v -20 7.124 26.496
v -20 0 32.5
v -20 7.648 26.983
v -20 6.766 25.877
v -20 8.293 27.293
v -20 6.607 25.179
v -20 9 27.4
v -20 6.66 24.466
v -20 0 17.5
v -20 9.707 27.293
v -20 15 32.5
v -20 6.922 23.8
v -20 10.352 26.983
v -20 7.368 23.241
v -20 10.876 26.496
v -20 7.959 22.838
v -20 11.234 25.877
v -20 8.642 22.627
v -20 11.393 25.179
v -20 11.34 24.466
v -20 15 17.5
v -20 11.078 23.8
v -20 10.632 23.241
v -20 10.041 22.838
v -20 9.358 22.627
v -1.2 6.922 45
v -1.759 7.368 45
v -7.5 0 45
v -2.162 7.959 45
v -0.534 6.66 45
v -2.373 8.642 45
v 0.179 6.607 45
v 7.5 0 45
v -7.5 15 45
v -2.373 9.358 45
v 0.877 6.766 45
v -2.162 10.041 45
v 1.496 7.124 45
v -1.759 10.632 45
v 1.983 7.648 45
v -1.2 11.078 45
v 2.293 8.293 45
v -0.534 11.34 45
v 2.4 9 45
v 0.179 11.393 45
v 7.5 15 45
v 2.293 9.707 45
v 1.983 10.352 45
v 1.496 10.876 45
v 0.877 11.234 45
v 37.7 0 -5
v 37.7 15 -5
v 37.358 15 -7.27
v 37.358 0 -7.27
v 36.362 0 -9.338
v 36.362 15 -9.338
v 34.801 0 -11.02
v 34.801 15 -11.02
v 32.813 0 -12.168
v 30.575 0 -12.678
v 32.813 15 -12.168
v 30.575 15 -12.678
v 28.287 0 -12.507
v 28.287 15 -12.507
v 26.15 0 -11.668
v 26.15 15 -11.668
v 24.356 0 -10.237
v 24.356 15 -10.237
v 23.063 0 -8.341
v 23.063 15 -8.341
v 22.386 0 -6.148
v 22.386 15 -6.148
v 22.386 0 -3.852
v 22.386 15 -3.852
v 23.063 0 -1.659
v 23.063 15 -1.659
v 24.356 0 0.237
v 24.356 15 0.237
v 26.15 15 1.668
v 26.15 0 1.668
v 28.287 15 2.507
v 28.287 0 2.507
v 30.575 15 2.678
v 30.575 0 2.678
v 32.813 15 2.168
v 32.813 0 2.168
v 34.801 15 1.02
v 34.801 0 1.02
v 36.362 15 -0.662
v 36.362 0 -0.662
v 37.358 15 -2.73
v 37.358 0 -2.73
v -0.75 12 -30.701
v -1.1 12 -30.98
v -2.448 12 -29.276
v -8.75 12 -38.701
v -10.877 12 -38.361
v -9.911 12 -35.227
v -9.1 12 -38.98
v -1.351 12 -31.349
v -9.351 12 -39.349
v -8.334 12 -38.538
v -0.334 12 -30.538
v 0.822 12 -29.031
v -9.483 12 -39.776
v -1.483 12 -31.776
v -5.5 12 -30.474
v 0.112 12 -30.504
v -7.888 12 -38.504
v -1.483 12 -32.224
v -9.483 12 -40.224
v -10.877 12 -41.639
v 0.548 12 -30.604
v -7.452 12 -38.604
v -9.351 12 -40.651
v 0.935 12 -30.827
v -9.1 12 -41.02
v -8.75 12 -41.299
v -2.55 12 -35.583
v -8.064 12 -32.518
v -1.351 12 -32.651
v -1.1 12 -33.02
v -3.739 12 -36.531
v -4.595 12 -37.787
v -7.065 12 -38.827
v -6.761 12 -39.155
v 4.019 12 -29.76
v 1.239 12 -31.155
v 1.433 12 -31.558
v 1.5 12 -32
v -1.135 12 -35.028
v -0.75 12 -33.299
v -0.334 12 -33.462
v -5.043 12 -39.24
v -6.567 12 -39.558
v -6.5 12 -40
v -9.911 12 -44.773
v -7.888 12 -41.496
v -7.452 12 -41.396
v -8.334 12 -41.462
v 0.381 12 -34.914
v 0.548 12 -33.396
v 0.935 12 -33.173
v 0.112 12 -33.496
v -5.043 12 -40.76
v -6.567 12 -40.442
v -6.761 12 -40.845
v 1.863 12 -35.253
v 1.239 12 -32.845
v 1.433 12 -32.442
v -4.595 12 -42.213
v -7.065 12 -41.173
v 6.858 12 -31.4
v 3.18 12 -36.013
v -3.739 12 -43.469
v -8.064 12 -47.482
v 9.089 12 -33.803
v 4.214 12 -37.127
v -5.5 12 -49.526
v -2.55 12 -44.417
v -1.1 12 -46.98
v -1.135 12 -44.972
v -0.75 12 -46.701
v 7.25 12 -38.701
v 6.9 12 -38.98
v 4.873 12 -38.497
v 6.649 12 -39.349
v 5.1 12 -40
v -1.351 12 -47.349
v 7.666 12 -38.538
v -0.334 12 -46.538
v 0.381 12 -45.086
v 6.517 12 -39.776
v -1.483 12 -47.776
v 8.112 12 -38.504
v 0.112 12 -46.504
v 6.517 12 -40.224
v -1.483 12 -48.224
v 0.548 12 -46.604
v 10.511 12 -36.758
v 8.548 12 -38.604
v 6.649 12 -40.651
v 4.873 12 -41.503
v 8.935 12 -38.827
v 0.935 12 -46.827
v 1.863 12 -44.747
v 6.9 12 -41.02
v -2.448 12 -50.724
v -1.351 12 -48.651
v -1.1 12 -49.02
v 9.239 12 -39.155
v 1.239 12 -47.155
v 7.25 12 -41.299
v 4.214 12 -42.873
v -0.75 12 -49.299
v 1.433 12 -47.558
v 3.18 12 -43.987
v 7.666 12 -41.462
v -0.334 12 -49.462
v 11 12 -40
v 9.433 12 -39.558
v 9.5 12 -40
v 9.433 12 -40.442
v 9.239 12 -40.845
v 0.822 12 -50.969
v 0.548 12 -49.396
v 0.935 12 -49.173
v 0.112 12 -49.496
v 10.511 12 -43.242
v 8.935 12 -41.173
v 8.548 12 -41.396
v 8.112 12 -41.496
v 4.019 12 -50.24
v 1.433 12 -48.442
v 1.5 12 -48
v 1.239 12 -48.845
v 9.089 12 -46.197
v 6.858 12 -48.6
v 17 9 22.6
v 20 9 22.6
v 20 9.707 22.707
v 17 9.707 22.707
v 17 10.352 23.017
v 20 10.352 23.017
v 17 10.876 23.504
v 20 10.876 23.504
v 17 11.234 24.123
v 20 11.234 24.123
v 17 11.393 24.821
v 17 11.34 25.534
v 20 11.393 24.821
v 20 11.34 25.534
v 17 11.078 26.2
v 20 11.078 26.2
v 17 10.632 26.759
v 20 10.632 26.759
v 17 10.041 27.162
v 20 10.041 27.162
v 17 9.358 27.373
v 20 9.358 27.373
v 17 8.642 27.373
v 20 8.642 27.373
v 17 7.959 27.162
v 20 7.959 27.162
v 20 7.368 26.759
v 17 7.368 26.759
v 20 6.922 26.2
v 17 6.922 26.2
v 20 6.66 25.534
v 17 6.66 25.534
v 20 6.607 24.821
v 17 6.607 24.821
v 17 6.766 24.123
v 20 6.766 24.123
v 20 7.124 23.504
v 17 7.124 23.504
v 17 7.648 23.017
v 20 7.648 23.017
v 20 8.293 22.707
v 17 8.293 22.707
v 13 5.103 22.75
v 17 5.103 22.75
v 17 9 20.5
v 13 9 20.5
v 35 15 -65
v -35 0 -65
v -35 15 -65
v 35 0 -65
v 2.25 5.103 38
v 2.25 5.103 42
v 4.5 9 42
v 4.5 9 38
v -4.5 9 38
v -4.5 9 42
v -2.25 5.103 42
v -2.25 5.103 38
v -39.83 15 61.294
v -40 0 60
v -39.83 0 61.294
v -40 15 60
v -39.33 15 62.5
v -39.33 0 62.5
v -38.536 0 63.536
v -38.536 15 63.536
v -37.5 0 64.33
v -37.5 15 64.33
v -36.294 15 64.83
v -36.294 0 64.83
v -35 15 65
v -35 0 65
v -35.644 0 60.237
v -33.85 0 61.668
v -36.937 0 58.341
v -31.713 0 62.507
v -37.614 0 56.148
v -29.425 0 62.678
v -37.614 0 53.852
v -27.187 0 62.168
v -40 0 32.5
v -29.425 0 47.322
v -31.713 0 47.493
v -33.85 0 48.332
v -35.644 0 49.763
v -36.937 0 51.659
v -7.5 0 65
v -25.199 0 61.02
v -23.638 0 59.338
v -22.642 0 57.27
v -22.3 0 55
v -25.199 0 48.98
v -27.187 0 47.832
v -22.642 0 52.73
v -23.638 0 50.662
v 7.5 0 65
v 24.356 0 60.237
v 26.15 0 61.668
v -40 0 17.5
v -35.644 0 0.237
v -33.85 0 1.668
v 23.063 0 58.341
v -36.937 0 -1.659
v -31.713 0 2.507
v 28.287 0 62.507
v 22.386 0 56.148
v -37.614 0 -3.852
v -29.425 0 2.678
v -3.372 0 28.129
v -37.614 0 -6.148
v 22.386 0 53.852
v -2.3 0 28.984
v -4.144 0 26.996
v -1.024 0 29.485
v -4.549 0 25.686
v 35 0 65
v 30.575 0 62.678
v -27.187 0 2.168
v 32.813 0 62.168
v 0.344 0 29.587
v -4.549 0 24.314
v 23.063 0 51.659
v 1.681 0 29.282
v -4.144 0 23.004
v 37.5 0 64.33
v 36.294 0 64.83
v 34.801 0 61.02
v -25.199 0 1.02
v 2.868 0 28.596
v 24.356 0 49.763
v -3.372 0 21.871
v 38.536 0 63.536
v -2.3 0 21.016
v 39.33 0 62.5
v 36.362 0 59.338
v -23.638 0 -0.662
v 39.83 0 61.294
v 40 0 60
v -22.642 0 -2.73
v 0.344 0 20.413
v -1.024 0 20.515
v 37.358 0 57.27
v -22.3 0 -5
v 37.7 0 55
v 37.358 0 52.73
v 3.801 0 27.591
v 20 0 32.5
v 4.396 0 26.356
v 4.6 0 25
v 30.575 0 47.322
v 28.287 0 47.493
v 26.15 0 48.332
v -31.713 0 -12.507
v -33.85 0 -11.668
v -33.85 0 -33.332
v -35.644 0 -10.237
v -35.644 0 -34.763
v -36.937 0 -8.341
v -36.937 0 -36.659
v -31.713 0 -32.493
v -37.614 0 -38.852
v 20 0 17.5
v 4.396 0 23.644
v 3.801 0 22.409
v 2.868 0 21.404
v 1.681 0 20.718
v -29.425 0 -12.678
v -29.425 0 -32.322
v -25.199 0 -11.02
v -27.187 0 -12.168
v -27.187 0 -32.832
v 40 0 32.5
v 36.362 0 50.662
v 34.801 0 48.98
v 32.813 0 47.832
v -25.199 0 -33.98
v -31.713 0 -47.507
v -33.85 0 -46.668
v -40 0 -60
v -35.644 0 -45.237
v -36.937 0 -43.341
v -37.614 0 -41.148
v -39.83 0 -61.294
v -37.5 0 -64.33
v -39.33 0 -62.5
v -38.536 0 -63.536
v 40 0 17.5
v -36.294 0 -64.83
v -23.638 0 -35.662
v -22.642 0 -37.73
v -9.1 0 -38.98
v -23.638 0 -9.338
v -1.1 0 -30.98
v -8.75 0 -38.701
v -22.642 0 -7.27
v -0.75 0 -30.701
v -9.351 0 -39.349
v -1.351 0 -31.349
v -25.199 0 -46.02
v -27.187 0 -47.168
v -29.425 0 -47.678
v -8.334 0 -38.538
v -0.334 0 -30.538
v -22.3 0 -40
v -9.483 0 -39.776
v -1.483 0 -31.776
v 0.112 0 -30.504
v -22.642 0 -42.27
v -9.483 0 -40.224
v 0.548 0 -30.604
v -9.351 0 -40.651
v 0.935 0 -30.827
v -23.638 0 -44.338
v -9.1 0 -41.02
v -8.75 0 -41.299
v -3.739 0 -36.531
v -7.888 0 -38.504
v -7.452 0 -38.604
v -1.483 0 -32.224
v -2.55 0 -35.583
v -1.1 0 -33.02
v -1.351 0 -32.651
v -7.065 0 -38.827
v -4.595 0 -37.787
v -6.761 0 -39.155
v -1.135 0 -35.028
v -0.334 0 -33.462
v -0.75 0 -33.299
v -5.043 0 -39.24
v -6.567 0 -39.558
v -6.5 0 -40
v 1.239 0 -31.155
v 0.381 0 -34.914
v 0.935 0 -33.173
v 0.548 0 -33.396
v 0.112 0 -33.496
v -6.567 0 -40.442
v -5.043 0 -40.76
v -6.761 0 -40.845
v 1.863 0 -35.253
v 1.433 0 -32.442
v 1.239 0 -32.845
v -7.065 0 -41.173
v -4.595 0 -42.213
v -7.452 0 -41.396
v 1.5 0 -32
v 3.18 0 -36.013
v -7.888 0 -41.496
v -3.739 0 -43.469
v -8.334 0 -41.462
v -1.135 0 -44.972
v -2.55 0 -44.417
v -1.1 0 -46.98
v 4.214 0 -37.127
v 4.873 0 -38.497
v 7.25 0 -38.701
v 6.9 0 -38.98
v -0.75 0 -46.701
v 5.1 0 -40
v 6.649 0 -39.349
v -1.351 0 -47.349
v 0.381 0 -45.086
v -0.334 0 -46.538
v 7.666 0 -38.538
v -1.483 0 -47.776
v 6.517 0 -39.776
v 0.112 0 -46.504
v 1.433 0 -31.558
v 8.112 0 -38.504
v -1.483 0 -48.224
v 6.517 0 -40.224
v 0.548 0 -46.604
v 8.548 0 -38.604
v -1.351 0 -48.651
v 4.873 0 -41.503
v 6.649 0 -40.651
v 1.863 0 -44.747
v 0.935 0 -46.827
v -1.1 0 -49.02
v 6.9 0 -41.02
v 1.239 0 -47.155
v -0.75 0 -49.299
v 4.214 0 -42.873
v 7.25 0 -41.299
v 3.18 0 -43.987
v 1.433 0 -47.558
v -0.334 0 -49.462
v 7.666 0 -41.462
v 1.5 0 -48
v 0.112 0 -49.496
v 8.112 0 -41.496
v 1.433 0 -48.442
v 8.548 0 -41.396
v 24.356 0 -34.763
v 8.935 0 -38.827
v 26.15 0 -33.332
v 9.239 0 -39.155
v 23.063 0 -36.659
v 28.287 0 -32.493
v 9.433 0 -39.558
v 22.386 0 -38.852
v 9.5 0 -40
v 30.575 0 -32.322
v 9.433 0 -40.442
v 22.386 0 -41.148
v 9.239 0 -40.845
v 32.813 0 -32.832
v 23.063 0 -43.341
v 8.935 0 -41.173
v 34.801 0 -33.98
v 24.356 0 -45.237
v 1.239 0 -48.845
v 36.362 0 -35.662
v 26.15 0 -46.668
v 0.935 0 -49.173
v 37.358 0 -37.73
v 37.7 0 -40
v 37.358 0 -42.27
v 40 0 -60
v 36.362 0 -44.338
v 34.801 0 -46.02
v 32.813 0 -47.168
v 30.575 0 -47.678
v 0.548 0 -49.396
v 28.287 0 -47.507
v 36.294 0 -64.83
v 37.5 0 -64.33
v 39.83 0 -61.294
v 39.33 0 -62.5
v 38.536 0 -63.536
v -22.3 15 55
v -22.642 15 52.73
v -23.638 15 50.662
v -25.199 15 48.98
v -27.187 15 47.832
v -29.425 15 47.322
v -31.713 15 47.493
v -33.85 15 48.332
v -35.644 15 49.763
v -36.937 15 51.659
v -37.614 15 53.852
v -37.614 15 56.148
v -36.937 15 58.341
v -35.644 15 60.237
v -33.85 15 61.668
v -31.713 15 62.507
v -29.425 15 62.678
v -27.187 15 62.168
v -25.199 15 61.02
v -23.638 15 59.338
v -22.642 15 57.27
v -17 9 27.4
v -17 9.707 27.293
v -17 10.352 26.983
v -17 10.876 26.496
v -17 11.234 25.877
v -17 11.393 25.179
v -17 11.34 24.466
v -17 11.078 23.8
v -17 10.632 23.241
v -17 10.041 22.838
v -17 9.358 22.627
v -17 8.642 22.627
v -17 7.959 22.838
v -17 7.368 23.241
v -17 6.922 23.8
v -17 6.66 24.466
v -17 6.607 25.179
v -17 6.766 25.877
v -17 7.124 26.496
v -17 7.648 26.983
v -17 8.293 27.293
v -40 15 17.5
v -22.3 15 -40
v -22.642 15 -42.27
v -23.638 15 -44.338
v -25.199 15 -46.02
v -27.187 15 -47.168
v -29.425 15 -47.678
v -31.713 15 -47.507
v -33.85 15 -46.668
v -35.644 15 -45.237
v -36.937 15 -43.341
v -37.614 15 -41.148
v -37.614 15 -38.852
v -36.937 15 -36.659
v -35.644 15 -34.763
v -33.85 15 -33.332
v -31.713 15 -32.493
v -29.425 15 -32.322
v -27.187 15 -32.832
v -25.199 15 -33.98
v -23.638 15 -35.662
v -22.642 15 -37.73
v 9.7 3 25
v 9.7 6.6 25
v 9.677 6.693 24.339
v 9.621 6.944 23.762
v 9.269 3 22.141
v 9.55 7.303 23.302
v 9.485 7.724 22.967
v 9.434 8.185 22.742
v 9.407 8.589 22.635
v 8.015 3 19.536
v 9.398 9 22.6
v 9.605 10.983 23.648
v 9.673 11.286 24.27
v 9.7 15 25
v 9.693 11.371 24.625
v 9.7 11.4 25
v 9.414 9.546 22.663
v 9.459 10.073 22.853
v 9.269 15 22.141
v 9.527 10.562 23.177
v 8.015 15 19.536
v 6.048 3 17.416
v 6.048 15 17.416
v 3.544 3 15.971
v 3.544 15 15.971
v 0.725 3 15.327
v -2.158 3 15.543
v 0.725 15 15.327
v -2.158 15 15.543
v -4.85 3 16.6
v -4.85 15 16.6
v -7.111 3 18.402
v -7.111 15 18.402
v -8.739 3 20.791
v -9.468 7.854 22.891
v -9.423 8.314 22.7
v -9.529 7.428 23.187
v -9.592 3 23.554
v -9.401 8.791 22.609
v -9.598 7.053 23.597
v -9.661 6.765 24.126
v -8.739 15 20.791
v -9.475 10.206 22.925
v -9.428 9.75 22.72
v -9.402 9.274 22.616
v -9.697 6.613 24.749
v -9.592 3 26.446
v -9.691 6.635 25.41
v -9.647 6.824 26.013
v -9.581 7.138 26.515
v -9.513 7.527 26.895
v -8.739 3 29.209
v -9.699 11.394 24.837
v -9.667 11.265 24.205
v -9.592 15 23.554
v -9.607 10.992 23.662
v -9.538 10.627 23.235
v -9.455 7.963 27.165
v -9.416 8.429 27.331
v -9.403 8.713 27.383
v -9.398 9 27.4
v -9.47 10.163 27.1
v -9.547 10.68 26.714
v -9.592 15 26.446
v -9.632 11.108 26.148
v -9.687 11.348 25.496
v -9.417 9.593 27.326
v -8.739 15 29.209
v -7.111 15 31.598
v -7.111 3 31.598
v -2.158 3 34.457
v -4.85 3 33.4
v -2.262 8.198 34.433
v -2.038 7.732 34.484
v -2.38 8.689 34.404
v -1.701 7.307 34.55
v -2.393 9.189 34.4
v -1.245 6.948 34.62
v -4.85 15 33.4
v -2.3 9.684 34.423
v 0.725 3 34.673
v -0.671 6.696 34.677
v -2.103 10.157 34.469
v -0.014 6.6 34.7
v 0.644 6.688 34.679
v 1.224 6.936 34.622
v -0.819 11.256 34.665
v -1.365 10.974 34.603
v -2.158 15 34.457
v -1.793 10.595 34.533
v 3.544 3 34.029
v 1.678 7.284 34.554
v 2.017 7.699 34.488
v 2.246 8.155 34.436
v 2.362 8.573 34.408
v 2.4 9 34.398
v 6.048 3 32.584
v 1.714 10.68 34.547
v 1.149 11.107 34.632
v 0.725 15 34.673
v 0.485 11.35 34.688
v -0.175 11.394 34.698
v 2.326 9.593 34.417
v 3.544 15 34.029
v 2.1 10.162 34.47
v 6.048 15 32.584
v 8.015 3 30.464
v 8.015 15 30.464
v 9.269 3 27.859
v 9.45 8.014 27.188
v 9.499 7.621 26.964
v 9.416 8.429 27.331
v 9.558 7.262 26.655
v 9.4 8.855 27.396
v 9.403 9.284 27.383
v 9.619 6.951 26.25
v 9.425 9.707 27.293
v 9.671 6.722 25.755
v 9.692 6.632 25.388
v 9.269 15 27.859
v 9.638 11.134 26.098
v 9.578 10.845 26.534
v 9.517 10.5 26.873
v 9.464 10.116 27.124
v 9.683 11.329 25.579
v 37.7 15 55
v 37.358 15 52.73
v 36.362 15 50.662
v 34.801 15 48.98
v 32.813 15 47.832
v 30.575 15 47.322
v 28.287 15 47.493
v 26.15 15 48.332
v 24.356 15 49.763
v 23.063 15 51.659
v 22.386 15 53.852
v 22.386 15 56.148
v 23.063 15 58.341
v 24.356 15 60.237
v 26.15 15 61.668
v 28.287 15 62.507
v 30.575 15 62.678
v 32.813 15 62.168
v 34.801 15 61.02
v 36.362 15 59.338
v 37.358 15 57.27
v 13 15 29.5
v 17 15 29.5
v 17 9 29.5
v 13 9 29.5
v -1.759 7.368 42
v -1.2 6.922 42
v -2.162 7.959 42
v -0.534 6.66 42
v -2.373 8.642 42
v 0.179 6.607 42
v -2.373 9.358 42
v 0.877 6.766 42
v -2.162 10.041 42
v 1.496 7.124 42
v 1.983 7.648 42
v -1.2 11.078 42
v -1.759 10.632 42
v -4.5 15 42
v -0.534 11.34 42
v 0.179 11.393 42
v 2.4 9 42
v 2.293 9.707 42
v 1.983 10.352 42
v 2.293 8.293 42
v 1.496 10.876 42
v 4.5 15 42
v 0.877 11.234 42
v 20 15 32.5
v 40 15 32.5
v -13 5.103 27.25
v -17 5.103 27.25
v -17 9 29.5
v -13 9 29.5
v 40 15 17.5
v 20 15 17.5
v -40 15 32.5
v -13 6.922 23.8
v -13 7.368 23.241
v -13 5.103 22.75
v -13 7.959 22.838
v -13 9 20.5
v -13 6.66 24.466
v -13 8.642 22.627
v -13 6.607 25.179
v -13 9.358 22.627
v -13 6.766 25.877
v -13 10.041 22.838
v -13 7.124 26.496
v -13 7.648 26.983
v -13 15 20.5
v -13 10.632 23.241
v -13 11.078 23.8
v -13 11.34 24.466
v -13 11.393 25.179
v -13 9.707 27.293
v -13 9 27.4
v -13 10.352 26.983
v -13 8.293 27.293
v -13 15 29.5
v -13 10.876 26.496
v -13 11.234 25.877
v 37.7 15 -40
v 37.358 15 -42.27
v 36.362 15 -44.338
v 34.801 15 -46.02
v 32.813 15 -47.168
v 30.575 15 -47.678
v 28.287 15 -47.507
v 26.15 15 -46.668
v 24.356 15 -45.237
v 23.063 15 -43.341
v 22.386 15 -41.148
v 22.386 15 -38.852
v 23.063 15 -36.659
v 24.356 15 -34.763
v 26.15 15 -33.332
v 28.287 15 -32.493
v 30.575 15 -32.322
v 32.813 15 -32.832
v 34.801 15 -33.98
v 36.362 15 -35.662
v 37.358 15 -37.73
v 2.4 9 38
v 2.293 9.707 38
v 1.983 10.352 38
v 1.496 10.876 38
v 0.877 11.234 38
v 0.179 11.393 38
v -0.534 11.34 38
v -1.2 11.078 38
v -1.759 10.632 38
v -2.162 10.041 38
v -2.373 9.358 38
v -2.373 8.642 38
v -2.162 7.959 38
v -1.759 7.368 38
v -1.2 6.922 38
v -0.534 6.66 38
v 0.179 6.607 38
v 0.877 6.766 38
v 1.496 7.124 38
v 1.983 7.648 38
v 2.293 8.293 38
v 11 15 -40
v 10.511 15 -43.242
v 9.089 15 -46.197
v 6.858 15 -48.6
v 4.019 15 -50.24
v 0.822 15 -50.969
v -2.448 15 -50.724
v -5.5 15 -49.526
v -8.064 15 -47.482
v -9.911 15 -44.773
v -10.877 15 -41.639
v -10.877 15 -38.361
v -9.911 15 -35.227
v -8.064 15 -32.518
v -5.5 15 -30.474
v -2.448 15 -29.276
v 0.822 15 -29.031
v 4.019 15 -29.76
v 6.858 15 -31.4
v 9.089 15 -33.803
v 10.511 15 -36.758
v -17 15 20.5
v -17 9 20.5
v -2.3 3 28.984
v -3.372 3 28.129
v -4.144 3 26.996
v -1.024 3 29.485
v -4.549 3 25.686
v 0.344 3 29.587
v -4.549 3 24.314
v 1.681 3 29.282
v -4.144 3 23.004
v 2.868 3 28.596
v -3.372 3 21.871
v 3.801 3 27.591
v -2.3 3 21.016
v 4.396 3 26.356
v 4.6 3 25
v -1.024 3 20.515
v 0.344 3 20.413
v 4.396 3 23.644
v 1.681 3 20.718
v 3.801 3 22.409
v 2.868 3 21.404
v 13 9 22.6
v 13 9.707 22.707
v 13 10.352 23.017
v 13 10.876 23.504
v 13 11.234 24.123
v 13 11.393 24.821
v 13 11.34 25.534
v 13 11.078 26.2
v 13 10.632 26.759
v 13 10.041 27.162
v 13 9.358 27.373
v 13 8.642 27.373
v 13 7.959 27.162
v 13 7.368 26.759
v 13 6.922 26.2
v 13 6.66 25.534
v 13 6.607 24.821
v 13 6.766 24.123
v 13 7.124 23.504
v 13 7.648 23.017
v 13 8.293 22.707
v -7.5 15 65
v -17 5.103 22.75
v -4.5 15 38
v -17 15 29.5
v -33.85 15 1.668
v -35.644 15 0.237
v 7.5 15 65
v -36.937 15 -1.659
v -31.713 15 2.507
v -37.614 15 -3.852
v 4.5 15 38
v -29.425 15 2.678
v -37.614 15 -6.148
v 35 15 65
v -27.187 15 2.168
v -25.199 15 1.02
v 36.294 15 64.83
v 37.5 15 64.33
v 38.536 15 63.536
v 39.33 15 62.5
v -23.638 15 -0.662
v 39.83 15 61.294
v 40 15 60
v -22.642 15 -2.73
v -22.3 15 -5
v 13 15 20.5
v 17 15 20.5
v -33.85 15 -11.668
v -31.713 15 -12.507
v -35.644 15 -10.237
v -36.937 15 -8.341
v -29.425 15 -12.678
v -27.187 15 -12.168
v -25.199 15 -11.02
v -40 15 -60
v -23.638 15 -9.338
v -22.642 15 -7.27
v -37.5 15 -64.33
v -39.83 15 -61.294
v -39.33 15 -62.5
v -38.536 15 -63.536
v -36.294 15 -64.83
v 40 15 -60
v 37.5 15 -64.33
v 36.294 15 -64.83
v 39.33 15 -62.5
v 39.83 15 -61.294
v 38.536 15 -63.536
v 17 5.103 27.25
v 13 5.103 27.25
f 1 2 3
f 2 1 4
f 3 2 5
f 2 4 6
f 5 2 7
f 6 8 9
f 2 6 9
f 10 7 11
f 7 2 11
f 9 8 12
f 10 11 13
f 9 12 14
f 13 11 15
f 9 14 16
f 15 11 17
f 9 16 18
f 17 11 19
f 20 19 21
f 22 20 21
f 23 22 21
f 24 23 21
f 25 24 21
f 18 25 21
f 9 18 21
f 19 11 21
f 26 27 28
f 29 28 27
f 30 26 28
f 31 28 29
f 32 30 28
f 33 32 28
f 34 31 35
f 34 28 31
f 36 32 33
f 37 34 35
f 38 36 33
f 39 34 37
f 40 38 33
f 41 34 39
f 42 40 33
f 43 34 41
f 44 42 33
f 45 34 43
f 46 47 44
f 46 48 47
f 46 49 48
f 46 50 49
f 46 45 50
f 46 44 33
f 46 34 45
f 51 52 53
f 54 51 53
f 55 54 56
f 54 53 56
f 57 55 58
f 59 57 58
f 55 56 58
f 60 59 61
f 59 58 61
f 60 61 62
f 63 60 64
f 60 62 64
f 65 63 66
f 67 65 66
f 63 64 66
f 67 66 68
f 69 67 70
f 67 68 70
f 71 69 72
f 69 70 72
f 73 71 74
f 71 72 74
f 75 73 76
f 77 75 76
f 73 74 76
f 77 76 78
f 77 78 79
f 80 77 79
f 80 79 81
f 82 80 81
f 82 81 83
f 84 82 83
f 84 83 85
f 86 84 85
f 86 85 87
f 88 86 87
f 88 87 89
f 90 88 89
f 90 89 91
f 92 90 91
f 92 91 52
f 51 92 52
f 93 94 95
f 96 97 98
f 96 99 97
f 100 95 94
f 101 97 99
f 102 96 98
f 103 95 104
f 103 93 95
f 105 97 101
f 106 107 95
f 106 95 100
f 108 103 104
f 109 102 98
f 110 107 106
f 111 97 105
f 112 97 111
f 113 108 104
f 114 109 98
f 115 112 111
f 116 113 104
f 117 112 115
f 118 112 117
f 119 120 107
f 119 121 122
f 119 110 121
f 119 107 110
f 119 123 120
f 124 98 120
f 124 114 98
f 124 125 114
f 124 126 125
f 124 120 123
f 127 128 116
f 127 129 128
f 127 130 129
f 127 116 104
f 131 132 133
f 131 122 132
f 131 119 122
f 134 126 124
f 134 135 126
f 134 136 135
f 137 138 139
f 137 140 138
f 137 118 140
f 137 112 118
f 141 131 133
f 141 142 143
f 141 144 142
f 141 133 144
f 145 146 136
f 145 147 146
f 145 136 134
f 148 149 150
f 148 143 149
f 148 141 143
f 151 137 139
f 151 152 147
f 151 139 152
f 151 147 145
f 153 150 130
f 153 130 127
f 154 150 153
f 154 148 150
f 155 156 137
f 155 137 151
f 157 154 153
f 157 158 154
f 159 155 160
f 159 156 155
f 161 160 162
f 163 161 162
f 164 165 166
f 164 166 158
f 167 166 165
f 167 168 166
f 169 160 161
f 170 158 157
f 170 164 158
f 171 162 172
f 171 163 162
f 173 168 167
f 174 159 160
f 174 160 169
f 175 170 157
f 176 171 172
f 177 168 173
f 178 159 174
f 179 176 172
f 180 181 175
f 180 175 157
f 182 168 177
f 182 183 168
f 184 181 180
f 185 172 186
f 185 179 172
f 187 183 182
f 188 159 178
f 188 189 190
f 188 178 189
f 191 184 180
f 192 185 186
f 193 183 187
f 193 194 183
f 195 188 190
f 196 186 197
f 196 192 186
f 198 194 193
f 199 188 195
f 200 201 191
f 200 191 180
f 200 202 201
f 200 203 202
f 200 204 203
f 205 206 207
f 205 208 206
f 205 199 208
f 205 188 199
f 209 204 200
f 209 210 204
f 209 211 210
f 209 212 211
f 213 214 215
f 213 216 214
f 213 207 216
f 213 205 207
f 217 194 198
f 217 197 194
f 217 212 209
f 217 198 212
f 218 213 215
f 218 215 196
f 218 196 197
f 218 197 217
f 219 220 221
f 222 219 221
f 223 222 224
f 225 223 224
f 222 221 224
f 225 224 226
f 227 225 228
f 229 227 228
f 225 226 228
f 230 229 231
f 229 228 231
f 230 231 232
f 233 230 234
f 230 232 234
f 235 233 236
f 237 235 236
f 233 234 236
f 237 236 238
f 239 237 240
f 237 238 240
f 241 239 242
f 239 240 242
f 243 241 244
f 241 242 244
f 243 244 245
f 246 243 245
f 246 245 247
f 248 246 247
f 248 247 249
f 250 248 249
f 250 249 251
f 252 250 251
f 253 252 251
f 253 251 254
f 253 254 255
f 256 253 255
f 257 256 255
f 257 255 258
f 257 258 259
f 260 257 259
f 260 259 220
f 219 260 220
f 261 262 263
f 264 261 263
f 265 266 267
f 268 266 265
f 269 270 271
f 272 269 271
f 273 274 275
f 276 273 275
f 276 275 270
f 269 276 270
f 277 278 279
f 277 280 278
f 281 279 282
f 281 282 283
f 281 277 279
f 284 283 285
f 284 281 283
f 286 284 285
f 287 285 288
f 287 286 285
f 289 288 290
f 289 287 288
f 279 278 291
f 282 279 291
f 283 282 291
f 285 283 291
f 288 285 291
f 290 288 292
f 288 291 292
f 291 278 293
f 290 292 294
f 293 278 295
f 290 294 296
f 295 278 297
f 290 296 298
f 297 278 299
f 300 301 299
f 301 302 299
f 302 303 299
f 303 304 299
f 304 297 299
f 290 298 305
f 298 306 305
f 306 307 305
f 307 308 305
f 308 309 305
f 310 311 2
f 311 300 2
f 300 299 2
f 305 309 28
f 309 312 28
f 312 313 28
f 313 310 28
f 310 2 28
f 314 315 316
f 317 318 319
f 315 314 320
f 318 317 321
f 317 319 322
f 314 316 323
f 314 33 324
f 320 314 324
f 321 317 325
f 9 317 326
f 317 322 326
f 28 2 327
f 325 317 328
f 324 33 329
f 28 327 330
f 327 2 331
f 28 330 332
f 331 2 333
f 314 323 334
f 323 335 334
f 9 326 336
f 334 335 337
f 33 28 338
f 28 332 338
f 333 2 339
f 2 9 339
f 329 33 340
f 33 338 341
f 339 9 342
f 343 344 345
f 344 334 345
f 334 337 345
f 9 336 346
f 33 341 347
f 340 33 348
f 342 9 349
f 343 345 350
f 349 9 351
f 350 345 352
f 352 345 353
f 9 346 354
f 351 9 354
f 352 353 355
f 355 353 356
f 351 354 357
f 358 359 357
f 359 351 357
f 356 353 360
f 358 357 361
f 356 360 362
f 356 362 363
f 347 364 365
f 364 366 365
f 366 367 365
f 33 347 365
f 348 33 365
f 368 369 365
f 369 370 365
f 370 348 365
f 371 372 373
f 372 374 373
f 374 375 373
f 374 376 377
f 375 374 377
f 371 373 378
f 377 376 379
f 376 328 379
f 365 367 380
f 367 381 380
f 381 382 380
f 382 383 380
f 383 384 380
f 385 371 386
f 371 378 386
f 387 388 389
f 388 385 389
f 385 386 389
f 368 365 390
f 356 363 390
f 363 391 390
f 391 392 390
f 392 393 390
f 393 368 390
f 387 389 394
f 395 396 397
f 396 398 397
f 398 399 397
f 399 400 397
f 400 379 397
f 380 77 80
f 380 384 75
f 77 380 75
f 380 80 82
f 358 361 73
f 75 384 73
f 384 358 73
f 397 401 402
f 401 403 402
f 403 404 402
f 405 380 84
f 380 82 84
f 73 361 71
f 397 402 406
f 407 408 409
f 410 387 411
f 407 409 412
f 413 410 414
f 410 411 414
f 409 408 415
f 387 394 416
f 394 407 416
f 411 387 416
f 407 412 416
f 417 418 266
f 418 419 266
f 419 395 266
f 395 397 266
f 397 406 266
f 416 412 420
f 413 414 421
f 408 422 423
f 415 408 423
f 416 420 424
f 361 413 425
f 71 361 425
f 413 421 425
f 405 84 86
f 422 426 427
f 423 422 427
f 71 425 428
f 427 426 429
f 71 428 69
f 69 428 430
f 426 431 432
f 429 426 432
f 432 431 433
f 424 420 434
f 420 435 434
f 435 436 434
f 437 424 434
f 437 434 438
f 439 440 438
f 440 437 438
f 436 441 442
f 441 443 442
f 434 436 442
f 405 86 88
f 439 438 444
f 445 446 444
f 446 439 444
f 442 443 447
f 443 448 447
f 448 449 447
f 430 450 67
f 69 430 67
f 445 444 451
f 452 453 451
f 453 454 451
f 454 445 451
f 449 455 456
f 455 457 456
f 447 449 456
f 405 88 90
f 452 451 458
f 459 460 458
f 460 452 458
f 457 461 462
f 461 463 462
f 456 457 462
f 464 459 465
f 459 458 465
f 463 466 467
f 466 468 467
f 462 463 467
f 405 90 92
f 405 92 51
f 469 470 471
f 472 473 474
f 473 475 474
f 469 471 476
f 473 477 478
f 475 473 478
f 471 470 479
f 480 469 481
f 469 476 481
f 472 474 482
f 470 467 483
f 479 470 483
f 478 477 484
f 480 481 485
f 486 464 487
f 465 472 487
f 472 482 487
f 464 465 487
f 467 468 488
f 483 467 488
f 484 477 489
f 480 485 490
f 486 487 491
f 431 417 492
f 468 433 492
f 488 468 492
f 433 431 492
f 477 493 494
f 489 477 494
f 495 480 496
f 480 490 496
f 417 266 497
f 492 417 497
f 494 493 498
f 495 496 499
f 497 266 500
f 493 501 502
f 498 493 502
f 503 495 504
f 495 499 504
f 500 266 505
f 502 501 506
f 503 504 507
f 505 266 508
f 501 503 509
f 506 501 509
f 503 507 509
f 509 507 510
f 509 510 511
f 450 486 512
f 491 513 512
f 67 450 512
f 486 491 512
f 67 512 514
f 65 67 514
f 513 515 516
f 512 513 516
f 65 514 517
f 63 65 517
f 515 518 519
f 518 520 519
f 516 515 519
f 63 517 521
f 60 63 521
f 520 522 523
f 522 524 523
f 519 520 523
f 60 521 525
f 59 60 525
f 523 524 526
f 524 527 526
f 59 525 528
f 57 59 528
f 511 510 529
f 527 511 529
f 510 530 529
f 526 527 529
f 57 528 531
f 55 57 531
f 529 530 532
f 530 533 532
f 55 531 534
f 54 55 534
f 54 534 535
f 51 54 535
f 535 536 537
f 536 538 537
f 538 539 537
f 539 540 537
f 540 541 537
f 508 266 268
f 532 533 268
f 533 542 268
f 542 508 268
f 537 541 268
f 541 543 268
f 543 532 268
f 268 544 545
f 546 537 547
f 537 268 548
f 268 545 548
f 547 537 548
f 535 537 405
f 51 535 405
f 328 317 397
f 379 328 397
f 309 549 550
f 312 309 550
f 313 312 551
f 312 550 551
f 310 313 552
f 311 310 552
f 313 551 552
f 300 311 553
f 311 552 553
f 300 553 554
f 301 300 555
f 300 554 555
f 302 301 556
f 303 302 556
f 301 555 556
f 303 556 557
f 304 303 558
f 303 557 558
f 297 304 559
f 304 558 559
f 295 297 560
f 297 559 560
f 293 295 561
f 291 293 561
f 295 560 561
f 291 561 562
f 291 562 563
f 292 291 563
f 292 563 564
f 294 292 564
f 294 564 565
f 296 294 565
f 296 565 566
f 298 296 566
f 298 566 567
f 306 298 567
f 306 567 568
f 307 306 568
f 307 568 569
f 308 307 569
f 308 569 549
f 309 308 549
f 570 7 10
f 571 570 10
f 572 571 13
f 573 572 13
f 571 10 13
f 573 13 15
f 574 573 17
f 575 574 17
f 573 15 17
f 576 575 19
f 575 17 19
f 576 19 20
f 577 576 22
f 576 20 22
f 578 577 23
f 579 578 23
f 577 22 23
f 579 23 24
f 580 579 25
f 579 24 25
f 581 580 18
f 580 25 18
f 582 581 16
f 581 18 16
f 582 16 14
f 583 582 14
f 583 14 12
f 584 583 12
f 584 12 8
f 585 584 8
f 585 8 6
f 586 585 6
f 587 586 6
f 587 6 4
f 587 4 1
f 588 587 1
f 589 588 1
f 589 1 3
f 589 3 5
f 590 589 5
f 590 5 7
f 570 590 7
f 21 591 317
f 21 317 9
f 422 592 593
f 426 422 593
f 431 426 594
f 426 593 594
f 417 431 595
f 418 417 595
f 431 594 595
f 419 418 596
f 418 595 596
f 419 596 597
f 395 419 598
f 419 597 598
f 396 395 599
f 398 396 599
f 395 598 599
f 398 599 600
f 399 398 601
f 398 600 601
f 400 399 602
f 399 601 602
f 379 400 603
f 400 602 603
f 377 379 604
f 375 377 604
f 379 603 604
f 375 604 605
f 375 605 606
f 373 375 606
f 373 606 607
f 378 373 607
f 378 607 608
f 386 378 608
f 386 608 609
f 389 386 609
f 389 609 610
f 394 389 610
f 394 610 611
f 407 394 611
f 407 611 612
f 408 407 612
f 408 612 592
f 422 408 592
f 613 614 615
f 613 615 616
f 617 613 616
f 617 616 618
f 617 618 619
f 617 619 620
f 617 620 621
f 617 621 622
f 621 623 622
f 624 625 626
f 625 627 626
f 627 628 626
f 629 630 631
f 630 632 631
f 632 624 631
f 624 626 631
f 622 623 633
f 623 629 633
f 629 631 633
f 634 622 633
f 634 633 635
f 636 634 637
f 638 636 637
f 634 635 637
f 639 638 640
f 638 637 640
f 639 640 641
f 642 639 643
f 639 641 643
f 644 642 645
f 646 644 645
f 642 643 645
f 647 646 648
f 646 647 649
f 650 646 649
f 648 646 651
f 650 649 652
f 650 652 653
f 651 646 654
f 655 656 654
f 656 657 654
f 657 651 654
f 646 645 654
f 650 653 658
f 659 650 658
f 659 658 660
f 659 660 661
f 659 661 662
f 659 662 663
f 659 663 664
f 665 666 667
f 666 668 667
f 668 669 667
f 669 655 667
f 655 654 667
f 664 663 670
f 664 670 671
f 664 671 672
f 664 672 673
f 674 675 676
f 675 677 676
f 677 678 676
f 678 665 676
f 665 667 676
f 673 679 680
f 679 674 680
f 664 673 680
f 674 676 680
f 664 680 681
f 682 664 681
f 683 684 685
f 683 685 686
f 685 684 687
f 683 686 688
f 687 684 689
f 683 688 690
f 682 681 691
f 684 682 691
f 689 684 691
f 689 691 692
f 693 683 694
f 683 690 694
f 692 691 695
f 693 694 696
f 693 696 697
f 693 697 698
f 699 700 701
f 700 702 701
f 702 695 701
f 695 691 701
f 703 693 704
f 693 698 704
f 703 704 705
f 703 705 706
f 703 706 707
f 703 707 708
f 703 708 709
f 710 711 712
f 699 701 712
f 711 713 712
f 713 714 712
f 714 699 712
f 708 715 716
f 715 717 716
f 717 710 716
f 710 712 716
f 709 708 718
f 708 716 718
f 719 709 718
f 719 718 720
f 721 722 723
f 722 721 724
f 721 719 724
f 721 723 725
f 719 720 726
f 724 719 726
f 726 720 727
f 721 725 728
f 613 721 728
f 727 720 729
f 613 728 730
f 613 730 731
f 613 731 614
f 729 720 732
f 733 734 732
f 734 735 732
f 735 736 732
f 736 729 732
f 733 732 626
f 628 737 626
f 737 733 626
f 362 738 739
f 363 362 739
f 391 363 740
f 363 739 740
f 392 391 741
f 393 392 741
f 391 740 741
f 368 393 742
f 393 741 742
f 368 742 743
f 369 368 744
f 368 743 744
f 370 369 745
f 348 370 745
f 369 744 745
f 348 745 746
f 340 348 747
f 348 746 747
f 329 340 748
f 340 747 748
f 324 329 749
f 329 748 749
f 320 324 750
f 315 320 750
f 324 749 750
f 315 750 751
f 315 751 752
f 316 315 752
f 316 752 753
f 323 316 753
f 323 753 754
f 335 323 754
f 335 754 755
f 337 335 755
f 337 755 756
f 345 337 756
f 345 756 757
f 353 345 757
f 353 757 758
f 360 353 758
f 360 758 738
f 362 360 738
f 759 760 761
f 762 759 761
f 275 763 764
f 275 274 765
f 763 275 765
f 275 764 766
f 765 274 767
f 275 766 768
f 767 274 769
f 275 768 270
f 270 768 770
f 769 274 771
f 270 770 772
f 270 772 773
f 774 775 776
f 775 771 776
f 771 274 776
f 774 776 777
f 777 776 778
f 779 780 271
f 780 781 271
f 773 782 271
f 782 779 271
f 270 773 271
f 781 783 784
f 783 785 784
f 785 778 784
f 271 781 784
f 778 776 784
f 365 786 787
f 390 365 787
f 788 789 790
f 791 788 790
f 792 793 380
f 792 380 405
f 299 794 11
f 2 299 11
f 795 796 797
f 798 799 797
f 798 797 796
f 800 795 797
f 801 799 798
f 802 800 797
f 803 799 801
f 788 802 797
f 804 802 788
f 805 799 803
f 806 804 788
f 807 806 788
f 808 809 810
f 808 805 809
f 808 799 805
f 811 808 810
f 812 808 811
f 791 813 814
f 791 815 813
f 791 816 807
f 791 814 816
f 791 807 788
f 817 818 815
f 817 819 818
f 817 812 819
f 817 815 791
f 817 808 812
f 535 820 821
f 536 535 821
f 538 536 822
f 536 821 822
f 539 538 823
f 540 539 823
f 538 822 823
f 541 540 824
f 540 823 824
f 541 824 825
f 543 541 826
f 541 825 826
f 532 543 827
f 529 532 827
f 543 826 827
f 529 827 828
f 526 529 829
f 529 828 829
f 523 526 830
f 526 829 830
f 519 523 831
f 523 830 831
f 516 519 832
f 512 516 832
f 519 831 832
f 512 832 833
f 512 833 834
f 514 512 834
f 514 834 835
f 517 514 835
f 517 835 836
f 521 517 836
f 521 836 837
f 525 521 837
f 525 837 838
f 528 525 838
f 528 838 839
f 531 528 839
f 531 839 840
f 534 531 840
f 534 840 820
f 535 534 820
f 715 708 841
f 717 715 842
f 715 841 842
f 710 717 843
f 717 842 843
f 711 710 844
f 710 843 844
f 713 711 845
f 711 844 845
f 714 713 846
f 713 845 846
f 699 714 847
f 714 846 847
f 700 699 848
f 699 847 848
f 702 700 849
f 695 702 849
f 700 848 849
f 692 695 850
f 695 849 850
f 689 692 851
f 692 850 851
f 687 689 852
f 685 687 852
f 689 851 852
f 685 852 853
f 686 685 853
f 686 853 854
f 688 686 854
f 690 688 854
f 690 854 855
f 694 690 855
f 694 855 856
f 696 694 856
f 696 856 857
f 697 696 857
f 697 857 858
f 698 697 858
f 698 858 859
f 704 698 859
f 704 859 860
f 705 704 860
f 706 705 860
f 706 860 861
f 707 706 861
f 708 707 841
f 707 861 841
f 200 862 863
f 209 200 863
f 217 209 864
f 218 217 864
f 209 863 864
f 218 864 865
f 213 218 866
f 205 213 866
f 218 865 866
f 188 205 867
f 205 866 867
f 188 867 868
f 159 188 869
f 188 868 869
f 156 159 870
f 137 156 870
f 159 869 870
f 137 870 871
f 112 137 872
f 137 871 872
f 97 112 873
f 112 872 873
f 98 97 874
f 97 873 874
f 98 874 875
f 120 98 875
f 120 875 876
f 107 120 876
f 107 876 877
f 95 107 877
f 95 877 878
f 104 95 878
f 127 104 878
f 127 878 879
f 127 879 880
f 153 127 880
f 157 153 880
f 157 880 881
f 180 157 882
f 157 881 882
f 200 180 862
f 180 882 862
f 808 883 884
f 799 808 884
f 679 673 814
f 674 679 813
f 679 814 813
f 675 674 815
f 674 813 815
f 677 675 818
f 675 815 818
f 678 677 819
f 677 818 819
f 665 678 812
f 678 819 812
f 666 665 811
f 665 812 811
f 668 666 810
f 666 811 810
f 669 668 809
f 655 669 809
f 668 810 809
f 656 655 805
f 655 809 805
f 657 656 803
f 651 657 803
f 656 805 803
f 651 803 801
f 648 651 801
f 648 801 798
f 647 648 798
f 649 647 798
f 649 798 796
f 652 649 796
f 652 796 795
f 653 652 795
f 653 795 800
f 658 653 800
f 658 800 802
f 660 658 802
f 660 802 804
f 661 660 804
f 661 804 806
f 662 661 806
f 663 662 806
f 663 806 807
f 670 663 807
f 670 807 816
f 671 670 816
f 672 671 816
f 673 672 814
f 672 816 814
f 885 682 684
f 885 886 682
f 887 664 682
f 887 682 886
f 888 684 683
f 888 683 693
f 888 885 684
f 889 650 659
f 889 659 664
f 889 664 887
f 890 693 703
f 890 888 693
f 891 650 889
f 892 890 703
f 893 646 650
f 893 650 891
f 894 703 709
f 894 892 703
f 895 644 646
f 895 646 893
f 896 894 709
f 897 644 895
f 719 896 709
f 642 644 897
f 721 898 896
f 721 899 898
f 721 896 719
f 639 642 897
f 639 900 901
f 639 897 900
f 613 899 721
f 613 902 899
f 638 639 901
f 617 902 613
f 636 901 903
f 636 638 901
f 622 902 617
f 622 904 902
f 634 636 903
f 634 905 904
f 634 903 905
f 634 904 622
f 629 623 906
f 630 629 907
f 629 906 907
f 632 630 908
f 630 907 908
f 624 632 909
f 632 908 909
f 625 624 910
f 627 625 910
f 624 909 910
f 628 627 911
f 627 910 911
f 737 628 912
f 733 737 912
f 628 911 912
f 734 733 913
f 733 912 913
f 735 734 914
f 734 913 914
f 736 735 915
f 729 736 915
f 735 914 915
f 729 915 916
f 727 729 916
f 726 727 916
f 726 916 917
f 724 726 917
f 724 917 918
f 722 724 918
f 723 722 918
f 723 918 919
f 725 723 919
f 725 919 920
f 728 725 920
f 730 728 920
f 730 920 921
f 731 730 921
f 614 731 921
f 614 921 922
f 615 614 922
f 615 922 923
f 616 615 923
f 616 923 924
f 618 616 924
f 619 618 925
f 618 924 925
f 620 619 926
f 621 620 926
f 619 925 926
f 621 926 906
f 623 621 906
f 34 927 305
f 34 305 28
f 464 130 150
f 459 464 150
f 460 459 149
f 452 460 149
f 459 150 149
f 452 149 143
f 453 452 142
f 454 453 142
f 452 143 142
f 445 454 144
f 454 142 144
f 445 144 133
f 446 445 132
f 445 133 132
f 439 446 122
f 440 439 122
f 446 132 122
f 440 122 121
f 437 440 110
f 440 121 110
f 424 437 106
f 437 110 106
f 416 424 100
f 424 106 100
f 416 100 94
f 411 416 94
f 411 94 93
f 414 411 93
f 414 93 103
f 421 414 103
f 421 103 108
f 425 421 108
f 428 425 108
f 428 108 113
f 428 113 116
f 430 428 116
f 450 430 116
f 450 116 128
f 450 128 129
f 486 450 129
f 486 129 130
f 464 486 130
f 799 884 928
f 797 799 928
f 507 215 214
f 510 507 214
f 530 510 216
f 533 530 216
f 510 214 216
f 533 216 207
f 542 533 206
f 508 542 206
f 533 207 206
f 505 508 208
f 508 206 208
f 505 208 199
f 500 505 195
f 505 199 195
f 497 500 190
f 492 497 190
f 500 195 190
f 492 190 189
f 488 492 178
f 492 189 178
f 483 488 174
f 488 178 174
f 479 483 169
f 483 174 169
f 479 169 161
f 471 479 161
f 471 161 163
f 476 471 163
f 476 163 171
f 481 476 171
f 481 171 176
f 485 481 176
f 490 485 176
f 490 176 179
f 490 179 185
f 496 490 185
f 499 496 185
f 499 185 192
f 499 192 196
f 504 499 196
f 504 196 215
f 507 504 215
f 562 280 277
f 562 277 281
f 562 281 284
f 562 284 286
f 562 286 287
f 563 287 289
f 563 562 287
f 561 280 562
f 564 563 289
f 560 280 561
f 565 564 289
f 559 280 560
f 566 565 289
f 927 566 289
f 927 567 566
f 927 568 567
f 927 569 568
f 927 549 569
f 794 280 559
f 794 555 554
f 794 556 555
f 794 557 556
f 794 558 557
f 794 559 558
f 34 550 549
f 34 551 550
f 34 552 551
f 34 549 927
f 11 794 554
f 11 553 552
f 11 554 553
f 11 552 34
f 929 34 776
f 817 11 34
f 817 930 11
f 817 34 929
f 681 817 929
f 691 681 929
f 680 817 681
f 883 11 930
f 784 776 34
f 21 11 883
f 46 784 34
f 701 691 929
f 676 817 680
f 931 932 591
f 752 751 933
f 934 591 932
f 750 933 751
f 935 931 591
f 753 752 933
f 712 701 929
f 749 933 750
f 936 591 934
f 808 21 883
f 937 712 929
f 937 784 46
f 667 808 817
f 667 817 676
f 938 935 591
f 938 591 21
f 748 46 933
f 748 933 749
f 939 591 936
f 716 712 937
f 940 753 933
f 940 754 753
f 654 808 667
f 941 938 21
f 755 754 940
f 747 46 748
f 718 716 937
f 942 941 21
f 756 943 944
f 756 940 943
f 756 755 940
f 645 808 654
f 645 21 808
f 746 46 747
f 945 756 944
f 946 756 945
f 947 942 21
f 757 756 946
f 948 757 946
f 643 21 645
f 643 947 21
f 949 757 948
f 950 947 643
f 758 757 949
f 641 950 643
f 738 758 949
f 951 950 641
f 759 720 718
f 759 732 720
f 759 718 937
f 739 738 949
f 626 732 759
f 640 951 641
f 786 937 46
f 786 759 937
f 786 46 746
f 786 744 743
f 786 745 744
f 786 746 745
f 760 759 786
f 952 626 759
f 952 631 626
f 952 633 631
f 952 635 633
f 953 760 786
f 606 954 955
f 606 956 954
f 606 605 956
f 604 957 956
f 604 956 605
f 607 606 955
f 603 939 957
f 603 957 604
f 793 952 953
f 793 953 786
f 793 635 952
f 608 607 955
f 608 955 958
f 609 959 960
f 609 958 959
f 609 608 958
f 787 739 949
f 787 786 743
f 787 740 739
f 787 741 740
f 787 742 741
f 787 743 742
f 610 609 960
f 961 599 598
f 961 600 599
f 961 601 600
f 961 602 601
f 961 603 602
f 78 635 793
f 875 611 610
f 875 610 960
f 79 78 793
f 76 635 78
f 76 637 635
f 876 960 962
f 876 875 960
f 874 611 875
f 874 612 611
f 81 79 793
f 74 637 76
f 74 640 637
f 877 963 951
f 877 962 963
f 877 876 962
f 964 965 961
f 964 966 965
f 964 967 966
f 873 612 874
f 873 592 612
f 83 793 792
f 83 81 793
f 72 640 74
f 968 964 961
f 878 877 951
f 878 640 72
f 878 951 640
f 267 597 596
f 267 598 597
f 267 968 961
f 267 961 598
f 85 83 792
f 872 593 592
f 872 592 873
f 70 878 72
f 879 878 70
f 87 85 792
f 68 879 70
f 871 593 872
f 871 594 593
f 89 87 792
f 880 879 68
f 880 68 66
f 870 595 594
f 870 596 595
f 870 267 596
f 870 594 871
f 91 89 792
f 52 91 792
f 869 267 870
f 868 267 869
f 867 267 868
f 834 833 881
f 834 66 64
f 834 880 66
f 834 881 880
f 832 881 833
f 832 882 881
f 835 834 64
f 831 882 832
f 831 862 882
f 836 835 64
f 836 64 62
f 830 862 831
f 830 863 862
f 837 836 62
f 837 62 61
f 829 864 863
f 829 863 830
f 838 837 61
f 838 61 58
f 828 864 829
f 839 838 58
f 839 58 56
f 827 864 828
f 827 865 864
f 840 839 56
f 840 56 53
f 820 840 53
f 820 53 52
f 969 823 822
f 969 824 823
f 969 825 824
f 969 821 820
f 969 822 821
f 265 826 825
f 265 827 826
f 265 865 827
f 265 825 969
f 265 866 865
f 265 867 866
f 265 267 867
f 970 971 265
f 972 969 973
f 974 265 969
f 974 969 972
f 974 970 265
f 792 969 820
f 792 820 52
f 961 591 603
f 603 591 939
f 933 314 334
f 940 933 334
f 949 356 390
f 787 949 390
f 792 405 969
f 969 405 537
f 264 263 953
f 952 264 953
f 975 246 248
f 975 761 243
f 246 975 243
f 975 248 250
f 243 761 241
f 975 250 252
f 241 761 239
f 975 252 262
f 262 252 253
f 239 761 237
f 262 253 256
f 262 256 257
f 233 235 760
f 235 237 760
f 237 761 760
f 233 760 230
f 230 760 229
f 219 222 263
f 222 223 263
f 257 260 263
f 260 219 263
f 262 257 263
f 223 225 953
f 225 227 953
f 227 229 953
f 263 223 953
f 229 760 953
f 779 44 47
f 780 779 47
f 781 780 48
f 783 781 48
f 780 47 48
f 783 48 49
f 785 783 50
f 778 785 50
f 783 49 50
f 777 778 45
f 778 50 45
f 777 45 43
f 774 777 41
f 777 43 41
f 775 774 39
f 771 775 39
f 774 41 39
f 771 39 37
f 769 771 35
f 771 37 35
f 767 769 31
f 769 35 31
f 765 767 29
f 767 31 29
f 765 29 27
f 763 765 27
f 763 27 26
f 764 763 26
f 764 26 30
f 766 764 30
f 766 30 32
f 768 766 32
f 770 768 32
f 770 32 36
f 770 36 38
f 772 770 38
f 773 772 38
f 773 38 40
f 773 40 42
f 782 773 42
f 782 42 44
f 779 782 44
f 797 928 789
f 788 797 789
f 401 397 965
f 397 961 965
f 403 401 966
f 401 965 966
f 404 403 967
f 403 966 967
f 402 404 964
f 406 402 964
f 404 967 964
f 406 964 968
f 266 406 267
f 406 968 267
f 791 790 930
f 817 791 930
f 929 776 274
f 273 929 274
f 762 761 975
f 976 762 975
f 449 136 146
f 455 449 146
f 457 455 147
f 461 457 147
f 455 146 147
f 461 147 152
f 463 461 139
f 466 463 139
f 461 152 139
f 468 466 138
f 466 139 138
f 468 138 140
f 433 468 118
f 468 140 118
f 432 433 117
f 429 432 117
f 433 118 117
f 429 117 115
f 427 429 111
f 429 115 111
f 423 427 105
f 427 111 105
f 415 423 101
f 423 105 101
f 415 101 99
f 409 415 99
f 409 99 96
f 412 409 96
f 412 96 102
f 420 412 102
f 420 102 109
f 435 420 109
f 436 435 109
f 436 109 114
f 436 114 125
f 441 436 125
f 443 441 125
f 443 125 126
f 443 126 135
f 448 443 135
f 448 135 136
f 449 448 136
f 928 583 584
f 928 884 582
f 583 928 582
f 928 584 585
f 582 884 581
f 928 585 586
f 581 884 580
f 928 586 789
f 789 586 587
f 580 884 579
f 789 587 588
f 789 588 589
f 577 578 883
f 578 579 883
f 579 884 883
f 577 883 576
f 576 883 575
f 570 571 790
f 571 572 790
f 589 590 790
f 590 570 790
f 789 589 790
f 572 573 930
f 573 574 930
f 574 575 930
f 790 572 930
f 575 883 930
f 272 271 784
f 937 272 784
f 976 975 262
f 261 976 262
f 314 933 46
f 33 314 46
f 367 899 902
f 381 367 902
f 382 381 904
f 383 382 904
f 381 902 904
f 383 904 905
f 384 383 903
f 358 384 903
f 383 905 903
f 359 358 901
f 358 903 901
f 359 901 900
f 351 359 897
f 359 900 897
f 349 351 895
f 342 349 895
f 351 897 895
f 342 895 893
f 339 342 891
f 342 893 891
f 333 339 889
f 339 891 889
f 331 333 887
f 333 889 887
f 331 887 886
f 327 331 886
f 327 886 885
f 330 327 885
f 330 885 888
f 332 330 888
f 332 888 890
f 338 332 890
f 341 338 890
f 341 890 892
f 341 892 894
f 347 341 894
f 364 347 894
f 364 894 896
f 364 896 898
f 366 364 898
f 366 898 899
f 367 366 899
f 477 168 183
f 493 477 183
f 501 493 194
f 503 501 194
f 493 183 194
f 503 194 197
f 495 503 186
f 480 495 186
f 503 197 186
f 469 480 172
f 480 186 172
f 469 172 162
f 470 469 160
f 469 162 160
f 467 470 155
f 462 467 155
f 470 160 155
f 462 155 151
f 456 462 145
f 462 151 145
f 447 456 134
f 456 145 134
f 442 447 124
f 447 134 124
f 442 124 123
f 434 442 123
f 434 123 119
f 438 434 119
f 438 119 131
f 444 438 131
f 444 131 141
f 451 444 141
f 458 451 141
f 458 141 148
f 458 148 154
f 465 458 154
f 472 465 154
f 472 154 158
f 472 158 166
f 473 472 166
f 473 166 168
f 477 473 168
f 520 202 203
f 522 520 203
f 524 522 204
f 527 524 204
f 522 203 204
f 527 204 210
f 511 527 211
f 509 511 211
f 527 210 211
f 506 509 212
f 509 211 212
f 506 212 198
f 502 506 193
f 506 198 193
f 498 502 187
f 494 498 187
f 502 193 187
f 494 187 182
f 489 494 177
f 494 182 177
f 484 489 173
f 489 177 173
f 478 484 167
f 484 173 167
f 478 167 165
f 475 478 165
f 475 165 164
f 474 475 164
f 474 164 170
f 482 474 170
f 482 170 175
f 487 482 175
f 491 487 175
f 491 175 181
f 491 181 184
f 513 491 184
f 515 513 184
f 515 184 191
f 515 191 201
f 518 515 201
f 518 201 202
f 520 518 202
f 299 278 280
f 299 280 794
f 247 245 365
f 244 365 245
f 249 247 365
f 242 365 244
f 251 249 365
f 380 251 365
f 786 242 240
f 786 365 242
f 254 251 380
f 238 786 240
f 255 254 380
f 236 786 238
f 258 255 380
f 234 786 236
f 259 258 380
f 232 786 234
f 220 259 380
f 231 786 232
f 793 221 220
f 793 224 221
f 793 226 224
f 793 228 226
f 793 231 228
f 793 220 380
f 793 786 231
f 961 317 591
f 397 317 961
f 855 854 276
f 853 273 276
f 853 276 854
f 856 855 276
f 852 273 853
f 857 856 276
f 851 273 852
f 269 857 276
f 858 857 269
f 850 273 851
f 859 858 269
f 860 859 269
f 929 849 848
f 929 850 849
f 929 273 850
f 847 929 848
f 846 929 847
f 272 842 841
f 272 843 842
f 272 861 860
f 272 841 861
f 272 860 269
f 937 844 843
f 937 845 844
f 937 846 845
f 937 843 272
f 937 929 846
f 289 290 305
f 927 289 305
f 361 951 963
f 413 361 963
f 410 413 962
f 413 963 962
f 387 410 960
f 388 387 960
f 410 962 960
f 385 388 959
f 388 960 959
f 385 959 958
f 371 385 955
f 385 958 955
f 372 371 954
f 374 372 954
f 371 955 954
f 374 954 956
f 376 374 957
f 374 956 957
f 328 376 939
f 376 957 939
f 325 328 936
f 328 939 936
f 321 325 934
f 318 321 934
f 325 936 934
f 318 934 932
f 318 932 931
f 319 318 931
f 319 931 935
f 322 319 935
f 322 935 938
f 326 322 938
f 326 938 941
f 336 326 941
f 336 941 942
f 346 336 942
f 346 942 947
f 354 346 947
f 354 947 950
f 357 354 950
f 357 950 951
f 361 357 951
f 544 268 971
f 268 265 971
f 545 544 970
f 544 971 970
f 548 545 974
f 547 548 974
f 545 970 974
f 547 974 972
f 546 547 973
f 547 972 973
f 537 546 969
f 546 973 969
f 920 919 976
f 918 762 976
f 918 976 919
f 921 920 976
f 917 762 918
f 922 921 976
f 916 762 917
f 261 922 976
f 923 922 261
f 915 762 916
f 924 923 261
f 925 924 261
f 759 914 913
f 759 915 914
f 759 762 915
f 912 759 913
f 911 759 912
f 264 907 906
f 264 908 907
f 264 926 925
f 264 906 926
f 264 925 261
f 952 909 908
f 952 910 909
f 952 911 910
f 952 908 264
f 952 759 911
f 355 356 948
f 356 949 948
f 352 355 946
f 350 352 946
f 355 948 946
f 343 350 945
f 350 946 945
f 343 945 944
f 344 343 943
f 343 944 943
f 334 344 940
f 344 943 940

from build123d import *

# Parameters (mm, degrees)
ESBO_O1_W                = 80
ESBO_O1_H                = 130
RESSALTO_EXTRUS_O1_DEPTH = 15
ESBO_O2_R                = 7.7
CORTE_EXTRUS_O1_DEPTH    = 16
ESBO_O3_R                = 9.7
CORTE_EXTRUS_O2_DEPTH    = 12
ESBO_O4_R                = 4.6
CORTE_EXTRUS_O3_DEPTH    = 4
ESBO_O5_W                = 15
ESBO_O5_H                = 20
ESBO_O5_W_2              = 20
ESBO_O5_H_2              = 15
CORTE_EXTRUS_O4_DEPTH    = 16
ESBO_O6_R                = 2.4
CORTE_EXTRUS_O5_DEPTH    = 15
ESBO_O7_R                = 2.4
CORTE_EXTRUS_O6_DEPTH    = 15
ESBO_O8_R                = 11
CORTE_EXTRUS_O7_DEPTH    = 3
ESBO_O10_R               = 5.1
ESBO_O10_R_2             = 1.5
CORTE_EXTRUS_O9_DEPTH    = 13
FILETE1_R                = 5
FILETE2_R                = 5
ESBO_O11_R               = 2.4
CORTE_EXTRUS_O10_DEPTH   = 15
CORTE_EXTRUS_O11_DEPTH   = 4
CORTE_EXTRUS_O12_DEPTH   = 4
CORTE_EXTRUS_O13_DEPTH   = 4


with BuildPart() as part:
    # Esboço1 → Ressalto-extrusão1 (new body)
    with BuildSketch(Plane(origin=(0, 0, 0), x_dir=(1, 0, 0), z_dir=(0, 1, 0))):
        Rectangle(ESBO_O1_W, ESBO_O1_H)
    extrude(amount=RESSALTO_EXTRUS_O1_DEPTH)

    # Esboço2 → Corte-extrusão1 (cut, through all)
    with BuildSketch(Plane(origin=(0, 15, 0), x_dir=(1, 0, 0), z_dir=(0, 1, 0))):
        with Locations((-30, 5)):
            Circle(ESBO_O2_R)
        with Locations((30, 5)):
            Circle(ESBO_O2_R)
        with Locations((-30, -55)):
            Circle(ESBO_O2_R)
        with Locations((30, -55)):
            Circle(ESBO_O2_R)
        with Locations((-30, 40)):
            Circle(ESBO_O2_R)
        with Locations((30, 40)):
            Circle(ESBO_O2_R)
    extrude(amount=-CORTE_EXTRUS_O1_DEPTH, mode=Mode.SUBTRACT)

    # Esboço3 → Corte-extrusão2 (cut)
    with BuildSketch(Plane(origin=(0, 15, 0), x_dir=(1, 0, 0), z_dir=(0, 1, 0))):
        with Locations((0, -25)):
            Circle(ESBO_O3_R)
    extrude(amount=-CORTE_EXTRUS_O2_DEPTH, mode=Mode.SUBTRACT)

    # Esboço4 → Corte-extrusão3 (cut, through all)
    with BuildSketch(Plane(origin=(0, 3, 0), x_dir=(1, 0, 0), z_dir=(0, 1, 0))):
        with Locations((0, -25)):
            Circle(ESBO_O4_R)
    extrude(amount=-CORTE_EXTRUS_O3_DEPTH, mode=Mode.SUBTRACT)

    # Esboço5 → Corte-extrusão4 (cut, through all)
    with BuildSketch(Plane(origin=(0, 15, 0), x_dir=(1, 0, 0), z_dir=(0, 1, 0))):
        with Locations((0, -55)):
            Rectangle(ESBO_O5_W, ESBO_O5_H)
        with Locations((30, -25)):
            Rectangle(ESBO_O5_W_2, ESBO_O5_H_2)
        with Locations((-30, -25)):
            Rectangle(ESBO_O5_W_2, ESBO_O5_H_2)
    extrude(amount=-CORTE_EXTRUS_O4_DEPTH, mode=Mode.SUBTRACT)

    # Esboço6 → Corte-extrusão5 (cut)
    with BuildSketch(Plane.XY.offset(45)):
        with Locations((0, 9)):
            Circle(ESBO_O6_R)
    extrude(amount=-CORTE_EXTRUS_O5_DEPTH, mode=Mode.SUBTRACT)

    # Esboço7 → Corte-extrusão6 (cut)
    with BuildSketch(Plane(origin=(20, 0, 0), x_dir=(0, 0, -1), z_dir=(1, 0, 0))):
        with Locations((-25, 9)):
            Circle(ESBO_O7_R)
    extrude(amount=-CORTE_EXTRUS_O6_DEPTH, mode=Mode.SUBTRACT)

    # Esboço8 → Corte-extrusão7 (cut)
    with BuildSketch(Plane(origin=(0, 15, 0), x_dir=(1, 0, 0), z_dir=(0, 1, 0))):
        with Locations((0, 40)):
            Circle(ESBO_O8_R)
    extrude(amount=-CORTE_EXTRUS_O7_DEPTH, mode=Mode.SUBTRACT)

    # Esboço10 → Corte-extrusão9 (cut, through all)
    with BuildSketch(Plane(origin=(0, 12, 0), x_dir=(1, 0, 0), z_dir=(0, 1, 0))):
        with Locations((0, 40)):
            Circle(ESBO_O10_R)
        with Locations((0, 48)):
            Circle(ESBO_O10_R_2)
        with Locations((8, 40)):
            Circle(ESBO_O10_R_2)
        with Locations((0, 32)):
            Circle(ESBO_O10_R_2)
        with Locations((-8, 40)):
            Circle(ESBO_O10_R_2)
    extrude(amount=-CORTE_EXTRUS_O9_DEPTH, mode=Mode.SUBTRACT)

    # Filete1
    filete1_edges = [part.edges().sort_by_distance(p)[0] for p in [
        (-40, 7.5, -65),
        (40, 7.5, -65),
    ]]
    fillet(filete1_edges, radius=FILETE1_R)

    # Filete2
    filete2_edges = [part.edges().sort_by_distance(p)[0] for p in [
        (40, 7.5, 65),
        (-40, 7.5, 65),
    ]]
    fillet(filete2_edges, radius=FILETE2_R)

    # Esboço11 → Corte-extrusão10 (cut)
    with BuildSketch(Plane.ZY.offset(20)):
        with Locations((25, 9)):
            Circle(ESBO_O11_R)
    extrude(amount=-CORTE_EXTRUS_O10_DEPTH, mode=Mode.SUBTRACT)

    # Esboço12 → Corte-extrusão11 (cut)
    with BuildSketch(Plane.ZY.offset(17)):
        Polygon((22.75, 5.102885683), (27.25, 5.102885683), (29.5, 9), (29.5, 15), (20.5, 15), (20.5, 9), align=None)
    extrude(amount=-CORTE_EXTRUS_O11_DEPTH, mode=Mode.SUBTRACT)

    # Esboço13 → Corte-extrusão12 (cut)
    with BuildSketch(Plane.XY.offset(42)):
        Polygon((-2.25, 5.102885683), (2.25, 5.102885683), (4.5, 9), (4.5, 15), (-4.5, 15), (-4.5, 9), align=None)
    extrude(amount=-CORTE_EXTRUS_O12_DEPTH, mode=Mode.SUBTRACT)

    # Esboço14 → Corte-extrusão13 (cut)
    with BuildSketch(Plane(origin=(17, 0, 0), x_dir=(0, 0, -1), z_dir=(1, 0, 0))):
        Polygon((-27.25, 5.102885683), (-22.75, 5.102885683), (-20.5, 9), (-20.5, 15), (-29.5, 15), (-29.5, 9), align=None)
    extrude(amount=-CORTE_EXTRUS_O13_DEPTH, mode=Mode.SUBTRACT)


solid = part.part
